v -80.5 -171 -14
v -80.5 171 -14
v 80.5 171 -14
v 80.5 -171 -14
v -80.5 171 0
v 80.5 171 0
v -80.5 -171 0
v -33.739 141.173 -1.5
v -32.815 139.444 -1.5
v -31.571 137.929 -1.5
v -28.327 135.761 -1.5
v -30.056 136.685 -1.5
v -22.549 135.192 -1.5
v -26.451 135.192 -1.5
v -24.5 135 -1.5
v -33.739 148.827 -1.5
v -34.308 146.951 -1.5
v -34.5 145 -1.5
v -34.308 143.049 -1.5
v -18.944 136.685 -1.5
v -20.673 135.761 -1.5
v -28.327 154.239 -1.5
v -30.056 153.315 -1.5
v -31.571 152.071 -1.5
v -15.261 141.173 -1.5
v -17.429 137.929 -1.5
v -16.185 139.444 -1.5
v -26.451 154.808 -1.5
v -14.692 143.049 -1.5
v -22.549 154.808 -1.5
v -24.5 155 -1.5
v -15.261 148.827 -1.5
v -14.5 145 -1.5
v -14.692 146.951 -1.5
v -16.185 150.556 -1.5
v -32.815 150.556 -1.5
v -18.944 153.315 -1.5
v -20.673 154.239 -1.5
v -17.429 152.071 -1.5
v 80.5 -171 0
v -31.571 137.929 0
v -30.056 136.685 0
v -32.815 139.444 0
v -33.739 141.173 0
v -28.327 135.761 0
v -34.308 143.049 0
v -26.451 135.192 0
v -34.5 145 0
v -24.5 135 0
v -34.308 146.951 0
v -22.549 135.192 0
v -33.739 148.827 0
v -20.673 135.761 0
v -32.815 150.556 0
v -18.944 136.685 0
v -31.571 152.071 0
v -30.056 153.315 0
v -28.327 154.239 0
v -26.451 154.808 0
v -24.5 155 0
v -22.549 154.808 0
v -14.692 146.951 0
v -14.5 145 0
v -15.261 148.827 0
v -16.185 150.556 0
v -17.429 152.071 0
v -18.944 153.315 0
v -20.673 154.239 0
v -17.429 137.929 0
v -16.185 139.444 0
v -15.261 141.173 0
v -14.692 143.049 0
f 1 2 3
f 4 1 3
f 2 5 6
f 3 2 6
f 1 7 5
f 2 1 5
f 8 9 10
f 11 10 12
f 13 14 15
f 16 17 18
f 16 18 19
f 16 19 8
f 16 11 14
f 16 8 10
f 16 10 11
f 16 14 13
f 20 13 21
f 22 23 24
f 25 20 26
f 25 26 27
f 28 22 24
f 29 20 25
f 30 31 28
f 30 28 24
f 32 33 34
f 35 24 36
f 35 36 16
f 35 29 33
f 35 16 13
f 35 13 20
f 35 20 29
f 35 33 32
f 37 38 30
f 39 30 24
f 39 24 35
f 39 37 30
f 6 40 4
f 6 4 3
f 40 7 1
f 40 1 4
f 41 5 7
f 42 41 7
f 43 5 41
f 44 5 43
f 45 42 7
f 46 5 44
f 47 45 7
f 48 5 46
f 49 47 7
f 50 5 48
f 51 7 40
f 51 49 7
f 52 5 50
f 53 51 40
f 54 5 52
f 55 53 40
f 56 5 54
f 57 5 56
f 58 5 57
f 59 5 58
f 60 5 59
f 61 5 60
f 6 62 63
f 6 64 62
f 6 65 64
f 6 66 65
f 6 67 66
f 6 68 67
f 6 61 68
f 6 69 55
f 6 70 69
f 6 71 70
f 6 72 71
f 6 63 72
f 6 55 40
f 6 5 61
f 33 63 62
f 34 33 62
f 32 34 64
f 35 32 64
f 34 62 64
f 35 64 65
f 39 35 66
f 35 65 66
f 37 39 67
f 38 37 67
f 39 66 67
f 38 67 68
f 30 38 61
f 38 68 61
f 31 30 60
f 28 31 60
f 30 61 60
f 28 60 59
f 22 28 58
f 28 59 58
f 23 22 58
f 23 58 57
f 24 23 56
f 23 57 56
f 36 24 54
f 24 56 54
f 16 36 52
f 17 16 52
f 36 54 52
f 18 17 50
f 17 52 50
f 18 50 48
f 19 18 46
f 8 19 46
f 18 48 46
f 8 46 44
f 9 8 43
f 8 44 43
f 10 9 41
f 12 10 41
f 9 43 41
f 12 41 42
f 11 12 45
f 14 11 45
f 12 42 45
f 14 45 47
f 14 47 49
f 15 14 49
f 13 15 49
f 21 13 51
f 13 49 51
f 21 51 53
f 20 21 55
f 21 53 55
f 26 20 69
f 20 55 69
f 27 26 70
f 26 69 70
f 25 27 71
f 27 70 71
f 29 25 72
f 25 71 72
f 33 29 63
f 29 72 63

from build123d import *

# Parameters (mm, degrees)
SKETCH_1_W          = 161
SKETCH_1_H          = 342
EXTRUDE_1_DEPTH     = 14
SKETCH_1_3_R        = 10
CUT_EXTRUDE_1_DEPTH = 1.5


with BuildPart() as part:
    # 草图1 → 凸台-拉伸1 (new body)
    with BuildSketch(Plane.XY):
        Rectangle(SKETCH_1_W, SKETCH_1_H)
    extrude(amount=-EXTRUDE_1_DEPTH)

    # 草图1<3> → 切除-拉伸1 (cut)
    with BuildSketch(Plane.XY):
        with Locations((-24.5, 145)):
            Circle(SKETCH_1_3_R)
    extrude(amount=-CUT_EXTRUDE_1_DEPTH, mode=Mode.SUBTRACT)


solid = part.part
